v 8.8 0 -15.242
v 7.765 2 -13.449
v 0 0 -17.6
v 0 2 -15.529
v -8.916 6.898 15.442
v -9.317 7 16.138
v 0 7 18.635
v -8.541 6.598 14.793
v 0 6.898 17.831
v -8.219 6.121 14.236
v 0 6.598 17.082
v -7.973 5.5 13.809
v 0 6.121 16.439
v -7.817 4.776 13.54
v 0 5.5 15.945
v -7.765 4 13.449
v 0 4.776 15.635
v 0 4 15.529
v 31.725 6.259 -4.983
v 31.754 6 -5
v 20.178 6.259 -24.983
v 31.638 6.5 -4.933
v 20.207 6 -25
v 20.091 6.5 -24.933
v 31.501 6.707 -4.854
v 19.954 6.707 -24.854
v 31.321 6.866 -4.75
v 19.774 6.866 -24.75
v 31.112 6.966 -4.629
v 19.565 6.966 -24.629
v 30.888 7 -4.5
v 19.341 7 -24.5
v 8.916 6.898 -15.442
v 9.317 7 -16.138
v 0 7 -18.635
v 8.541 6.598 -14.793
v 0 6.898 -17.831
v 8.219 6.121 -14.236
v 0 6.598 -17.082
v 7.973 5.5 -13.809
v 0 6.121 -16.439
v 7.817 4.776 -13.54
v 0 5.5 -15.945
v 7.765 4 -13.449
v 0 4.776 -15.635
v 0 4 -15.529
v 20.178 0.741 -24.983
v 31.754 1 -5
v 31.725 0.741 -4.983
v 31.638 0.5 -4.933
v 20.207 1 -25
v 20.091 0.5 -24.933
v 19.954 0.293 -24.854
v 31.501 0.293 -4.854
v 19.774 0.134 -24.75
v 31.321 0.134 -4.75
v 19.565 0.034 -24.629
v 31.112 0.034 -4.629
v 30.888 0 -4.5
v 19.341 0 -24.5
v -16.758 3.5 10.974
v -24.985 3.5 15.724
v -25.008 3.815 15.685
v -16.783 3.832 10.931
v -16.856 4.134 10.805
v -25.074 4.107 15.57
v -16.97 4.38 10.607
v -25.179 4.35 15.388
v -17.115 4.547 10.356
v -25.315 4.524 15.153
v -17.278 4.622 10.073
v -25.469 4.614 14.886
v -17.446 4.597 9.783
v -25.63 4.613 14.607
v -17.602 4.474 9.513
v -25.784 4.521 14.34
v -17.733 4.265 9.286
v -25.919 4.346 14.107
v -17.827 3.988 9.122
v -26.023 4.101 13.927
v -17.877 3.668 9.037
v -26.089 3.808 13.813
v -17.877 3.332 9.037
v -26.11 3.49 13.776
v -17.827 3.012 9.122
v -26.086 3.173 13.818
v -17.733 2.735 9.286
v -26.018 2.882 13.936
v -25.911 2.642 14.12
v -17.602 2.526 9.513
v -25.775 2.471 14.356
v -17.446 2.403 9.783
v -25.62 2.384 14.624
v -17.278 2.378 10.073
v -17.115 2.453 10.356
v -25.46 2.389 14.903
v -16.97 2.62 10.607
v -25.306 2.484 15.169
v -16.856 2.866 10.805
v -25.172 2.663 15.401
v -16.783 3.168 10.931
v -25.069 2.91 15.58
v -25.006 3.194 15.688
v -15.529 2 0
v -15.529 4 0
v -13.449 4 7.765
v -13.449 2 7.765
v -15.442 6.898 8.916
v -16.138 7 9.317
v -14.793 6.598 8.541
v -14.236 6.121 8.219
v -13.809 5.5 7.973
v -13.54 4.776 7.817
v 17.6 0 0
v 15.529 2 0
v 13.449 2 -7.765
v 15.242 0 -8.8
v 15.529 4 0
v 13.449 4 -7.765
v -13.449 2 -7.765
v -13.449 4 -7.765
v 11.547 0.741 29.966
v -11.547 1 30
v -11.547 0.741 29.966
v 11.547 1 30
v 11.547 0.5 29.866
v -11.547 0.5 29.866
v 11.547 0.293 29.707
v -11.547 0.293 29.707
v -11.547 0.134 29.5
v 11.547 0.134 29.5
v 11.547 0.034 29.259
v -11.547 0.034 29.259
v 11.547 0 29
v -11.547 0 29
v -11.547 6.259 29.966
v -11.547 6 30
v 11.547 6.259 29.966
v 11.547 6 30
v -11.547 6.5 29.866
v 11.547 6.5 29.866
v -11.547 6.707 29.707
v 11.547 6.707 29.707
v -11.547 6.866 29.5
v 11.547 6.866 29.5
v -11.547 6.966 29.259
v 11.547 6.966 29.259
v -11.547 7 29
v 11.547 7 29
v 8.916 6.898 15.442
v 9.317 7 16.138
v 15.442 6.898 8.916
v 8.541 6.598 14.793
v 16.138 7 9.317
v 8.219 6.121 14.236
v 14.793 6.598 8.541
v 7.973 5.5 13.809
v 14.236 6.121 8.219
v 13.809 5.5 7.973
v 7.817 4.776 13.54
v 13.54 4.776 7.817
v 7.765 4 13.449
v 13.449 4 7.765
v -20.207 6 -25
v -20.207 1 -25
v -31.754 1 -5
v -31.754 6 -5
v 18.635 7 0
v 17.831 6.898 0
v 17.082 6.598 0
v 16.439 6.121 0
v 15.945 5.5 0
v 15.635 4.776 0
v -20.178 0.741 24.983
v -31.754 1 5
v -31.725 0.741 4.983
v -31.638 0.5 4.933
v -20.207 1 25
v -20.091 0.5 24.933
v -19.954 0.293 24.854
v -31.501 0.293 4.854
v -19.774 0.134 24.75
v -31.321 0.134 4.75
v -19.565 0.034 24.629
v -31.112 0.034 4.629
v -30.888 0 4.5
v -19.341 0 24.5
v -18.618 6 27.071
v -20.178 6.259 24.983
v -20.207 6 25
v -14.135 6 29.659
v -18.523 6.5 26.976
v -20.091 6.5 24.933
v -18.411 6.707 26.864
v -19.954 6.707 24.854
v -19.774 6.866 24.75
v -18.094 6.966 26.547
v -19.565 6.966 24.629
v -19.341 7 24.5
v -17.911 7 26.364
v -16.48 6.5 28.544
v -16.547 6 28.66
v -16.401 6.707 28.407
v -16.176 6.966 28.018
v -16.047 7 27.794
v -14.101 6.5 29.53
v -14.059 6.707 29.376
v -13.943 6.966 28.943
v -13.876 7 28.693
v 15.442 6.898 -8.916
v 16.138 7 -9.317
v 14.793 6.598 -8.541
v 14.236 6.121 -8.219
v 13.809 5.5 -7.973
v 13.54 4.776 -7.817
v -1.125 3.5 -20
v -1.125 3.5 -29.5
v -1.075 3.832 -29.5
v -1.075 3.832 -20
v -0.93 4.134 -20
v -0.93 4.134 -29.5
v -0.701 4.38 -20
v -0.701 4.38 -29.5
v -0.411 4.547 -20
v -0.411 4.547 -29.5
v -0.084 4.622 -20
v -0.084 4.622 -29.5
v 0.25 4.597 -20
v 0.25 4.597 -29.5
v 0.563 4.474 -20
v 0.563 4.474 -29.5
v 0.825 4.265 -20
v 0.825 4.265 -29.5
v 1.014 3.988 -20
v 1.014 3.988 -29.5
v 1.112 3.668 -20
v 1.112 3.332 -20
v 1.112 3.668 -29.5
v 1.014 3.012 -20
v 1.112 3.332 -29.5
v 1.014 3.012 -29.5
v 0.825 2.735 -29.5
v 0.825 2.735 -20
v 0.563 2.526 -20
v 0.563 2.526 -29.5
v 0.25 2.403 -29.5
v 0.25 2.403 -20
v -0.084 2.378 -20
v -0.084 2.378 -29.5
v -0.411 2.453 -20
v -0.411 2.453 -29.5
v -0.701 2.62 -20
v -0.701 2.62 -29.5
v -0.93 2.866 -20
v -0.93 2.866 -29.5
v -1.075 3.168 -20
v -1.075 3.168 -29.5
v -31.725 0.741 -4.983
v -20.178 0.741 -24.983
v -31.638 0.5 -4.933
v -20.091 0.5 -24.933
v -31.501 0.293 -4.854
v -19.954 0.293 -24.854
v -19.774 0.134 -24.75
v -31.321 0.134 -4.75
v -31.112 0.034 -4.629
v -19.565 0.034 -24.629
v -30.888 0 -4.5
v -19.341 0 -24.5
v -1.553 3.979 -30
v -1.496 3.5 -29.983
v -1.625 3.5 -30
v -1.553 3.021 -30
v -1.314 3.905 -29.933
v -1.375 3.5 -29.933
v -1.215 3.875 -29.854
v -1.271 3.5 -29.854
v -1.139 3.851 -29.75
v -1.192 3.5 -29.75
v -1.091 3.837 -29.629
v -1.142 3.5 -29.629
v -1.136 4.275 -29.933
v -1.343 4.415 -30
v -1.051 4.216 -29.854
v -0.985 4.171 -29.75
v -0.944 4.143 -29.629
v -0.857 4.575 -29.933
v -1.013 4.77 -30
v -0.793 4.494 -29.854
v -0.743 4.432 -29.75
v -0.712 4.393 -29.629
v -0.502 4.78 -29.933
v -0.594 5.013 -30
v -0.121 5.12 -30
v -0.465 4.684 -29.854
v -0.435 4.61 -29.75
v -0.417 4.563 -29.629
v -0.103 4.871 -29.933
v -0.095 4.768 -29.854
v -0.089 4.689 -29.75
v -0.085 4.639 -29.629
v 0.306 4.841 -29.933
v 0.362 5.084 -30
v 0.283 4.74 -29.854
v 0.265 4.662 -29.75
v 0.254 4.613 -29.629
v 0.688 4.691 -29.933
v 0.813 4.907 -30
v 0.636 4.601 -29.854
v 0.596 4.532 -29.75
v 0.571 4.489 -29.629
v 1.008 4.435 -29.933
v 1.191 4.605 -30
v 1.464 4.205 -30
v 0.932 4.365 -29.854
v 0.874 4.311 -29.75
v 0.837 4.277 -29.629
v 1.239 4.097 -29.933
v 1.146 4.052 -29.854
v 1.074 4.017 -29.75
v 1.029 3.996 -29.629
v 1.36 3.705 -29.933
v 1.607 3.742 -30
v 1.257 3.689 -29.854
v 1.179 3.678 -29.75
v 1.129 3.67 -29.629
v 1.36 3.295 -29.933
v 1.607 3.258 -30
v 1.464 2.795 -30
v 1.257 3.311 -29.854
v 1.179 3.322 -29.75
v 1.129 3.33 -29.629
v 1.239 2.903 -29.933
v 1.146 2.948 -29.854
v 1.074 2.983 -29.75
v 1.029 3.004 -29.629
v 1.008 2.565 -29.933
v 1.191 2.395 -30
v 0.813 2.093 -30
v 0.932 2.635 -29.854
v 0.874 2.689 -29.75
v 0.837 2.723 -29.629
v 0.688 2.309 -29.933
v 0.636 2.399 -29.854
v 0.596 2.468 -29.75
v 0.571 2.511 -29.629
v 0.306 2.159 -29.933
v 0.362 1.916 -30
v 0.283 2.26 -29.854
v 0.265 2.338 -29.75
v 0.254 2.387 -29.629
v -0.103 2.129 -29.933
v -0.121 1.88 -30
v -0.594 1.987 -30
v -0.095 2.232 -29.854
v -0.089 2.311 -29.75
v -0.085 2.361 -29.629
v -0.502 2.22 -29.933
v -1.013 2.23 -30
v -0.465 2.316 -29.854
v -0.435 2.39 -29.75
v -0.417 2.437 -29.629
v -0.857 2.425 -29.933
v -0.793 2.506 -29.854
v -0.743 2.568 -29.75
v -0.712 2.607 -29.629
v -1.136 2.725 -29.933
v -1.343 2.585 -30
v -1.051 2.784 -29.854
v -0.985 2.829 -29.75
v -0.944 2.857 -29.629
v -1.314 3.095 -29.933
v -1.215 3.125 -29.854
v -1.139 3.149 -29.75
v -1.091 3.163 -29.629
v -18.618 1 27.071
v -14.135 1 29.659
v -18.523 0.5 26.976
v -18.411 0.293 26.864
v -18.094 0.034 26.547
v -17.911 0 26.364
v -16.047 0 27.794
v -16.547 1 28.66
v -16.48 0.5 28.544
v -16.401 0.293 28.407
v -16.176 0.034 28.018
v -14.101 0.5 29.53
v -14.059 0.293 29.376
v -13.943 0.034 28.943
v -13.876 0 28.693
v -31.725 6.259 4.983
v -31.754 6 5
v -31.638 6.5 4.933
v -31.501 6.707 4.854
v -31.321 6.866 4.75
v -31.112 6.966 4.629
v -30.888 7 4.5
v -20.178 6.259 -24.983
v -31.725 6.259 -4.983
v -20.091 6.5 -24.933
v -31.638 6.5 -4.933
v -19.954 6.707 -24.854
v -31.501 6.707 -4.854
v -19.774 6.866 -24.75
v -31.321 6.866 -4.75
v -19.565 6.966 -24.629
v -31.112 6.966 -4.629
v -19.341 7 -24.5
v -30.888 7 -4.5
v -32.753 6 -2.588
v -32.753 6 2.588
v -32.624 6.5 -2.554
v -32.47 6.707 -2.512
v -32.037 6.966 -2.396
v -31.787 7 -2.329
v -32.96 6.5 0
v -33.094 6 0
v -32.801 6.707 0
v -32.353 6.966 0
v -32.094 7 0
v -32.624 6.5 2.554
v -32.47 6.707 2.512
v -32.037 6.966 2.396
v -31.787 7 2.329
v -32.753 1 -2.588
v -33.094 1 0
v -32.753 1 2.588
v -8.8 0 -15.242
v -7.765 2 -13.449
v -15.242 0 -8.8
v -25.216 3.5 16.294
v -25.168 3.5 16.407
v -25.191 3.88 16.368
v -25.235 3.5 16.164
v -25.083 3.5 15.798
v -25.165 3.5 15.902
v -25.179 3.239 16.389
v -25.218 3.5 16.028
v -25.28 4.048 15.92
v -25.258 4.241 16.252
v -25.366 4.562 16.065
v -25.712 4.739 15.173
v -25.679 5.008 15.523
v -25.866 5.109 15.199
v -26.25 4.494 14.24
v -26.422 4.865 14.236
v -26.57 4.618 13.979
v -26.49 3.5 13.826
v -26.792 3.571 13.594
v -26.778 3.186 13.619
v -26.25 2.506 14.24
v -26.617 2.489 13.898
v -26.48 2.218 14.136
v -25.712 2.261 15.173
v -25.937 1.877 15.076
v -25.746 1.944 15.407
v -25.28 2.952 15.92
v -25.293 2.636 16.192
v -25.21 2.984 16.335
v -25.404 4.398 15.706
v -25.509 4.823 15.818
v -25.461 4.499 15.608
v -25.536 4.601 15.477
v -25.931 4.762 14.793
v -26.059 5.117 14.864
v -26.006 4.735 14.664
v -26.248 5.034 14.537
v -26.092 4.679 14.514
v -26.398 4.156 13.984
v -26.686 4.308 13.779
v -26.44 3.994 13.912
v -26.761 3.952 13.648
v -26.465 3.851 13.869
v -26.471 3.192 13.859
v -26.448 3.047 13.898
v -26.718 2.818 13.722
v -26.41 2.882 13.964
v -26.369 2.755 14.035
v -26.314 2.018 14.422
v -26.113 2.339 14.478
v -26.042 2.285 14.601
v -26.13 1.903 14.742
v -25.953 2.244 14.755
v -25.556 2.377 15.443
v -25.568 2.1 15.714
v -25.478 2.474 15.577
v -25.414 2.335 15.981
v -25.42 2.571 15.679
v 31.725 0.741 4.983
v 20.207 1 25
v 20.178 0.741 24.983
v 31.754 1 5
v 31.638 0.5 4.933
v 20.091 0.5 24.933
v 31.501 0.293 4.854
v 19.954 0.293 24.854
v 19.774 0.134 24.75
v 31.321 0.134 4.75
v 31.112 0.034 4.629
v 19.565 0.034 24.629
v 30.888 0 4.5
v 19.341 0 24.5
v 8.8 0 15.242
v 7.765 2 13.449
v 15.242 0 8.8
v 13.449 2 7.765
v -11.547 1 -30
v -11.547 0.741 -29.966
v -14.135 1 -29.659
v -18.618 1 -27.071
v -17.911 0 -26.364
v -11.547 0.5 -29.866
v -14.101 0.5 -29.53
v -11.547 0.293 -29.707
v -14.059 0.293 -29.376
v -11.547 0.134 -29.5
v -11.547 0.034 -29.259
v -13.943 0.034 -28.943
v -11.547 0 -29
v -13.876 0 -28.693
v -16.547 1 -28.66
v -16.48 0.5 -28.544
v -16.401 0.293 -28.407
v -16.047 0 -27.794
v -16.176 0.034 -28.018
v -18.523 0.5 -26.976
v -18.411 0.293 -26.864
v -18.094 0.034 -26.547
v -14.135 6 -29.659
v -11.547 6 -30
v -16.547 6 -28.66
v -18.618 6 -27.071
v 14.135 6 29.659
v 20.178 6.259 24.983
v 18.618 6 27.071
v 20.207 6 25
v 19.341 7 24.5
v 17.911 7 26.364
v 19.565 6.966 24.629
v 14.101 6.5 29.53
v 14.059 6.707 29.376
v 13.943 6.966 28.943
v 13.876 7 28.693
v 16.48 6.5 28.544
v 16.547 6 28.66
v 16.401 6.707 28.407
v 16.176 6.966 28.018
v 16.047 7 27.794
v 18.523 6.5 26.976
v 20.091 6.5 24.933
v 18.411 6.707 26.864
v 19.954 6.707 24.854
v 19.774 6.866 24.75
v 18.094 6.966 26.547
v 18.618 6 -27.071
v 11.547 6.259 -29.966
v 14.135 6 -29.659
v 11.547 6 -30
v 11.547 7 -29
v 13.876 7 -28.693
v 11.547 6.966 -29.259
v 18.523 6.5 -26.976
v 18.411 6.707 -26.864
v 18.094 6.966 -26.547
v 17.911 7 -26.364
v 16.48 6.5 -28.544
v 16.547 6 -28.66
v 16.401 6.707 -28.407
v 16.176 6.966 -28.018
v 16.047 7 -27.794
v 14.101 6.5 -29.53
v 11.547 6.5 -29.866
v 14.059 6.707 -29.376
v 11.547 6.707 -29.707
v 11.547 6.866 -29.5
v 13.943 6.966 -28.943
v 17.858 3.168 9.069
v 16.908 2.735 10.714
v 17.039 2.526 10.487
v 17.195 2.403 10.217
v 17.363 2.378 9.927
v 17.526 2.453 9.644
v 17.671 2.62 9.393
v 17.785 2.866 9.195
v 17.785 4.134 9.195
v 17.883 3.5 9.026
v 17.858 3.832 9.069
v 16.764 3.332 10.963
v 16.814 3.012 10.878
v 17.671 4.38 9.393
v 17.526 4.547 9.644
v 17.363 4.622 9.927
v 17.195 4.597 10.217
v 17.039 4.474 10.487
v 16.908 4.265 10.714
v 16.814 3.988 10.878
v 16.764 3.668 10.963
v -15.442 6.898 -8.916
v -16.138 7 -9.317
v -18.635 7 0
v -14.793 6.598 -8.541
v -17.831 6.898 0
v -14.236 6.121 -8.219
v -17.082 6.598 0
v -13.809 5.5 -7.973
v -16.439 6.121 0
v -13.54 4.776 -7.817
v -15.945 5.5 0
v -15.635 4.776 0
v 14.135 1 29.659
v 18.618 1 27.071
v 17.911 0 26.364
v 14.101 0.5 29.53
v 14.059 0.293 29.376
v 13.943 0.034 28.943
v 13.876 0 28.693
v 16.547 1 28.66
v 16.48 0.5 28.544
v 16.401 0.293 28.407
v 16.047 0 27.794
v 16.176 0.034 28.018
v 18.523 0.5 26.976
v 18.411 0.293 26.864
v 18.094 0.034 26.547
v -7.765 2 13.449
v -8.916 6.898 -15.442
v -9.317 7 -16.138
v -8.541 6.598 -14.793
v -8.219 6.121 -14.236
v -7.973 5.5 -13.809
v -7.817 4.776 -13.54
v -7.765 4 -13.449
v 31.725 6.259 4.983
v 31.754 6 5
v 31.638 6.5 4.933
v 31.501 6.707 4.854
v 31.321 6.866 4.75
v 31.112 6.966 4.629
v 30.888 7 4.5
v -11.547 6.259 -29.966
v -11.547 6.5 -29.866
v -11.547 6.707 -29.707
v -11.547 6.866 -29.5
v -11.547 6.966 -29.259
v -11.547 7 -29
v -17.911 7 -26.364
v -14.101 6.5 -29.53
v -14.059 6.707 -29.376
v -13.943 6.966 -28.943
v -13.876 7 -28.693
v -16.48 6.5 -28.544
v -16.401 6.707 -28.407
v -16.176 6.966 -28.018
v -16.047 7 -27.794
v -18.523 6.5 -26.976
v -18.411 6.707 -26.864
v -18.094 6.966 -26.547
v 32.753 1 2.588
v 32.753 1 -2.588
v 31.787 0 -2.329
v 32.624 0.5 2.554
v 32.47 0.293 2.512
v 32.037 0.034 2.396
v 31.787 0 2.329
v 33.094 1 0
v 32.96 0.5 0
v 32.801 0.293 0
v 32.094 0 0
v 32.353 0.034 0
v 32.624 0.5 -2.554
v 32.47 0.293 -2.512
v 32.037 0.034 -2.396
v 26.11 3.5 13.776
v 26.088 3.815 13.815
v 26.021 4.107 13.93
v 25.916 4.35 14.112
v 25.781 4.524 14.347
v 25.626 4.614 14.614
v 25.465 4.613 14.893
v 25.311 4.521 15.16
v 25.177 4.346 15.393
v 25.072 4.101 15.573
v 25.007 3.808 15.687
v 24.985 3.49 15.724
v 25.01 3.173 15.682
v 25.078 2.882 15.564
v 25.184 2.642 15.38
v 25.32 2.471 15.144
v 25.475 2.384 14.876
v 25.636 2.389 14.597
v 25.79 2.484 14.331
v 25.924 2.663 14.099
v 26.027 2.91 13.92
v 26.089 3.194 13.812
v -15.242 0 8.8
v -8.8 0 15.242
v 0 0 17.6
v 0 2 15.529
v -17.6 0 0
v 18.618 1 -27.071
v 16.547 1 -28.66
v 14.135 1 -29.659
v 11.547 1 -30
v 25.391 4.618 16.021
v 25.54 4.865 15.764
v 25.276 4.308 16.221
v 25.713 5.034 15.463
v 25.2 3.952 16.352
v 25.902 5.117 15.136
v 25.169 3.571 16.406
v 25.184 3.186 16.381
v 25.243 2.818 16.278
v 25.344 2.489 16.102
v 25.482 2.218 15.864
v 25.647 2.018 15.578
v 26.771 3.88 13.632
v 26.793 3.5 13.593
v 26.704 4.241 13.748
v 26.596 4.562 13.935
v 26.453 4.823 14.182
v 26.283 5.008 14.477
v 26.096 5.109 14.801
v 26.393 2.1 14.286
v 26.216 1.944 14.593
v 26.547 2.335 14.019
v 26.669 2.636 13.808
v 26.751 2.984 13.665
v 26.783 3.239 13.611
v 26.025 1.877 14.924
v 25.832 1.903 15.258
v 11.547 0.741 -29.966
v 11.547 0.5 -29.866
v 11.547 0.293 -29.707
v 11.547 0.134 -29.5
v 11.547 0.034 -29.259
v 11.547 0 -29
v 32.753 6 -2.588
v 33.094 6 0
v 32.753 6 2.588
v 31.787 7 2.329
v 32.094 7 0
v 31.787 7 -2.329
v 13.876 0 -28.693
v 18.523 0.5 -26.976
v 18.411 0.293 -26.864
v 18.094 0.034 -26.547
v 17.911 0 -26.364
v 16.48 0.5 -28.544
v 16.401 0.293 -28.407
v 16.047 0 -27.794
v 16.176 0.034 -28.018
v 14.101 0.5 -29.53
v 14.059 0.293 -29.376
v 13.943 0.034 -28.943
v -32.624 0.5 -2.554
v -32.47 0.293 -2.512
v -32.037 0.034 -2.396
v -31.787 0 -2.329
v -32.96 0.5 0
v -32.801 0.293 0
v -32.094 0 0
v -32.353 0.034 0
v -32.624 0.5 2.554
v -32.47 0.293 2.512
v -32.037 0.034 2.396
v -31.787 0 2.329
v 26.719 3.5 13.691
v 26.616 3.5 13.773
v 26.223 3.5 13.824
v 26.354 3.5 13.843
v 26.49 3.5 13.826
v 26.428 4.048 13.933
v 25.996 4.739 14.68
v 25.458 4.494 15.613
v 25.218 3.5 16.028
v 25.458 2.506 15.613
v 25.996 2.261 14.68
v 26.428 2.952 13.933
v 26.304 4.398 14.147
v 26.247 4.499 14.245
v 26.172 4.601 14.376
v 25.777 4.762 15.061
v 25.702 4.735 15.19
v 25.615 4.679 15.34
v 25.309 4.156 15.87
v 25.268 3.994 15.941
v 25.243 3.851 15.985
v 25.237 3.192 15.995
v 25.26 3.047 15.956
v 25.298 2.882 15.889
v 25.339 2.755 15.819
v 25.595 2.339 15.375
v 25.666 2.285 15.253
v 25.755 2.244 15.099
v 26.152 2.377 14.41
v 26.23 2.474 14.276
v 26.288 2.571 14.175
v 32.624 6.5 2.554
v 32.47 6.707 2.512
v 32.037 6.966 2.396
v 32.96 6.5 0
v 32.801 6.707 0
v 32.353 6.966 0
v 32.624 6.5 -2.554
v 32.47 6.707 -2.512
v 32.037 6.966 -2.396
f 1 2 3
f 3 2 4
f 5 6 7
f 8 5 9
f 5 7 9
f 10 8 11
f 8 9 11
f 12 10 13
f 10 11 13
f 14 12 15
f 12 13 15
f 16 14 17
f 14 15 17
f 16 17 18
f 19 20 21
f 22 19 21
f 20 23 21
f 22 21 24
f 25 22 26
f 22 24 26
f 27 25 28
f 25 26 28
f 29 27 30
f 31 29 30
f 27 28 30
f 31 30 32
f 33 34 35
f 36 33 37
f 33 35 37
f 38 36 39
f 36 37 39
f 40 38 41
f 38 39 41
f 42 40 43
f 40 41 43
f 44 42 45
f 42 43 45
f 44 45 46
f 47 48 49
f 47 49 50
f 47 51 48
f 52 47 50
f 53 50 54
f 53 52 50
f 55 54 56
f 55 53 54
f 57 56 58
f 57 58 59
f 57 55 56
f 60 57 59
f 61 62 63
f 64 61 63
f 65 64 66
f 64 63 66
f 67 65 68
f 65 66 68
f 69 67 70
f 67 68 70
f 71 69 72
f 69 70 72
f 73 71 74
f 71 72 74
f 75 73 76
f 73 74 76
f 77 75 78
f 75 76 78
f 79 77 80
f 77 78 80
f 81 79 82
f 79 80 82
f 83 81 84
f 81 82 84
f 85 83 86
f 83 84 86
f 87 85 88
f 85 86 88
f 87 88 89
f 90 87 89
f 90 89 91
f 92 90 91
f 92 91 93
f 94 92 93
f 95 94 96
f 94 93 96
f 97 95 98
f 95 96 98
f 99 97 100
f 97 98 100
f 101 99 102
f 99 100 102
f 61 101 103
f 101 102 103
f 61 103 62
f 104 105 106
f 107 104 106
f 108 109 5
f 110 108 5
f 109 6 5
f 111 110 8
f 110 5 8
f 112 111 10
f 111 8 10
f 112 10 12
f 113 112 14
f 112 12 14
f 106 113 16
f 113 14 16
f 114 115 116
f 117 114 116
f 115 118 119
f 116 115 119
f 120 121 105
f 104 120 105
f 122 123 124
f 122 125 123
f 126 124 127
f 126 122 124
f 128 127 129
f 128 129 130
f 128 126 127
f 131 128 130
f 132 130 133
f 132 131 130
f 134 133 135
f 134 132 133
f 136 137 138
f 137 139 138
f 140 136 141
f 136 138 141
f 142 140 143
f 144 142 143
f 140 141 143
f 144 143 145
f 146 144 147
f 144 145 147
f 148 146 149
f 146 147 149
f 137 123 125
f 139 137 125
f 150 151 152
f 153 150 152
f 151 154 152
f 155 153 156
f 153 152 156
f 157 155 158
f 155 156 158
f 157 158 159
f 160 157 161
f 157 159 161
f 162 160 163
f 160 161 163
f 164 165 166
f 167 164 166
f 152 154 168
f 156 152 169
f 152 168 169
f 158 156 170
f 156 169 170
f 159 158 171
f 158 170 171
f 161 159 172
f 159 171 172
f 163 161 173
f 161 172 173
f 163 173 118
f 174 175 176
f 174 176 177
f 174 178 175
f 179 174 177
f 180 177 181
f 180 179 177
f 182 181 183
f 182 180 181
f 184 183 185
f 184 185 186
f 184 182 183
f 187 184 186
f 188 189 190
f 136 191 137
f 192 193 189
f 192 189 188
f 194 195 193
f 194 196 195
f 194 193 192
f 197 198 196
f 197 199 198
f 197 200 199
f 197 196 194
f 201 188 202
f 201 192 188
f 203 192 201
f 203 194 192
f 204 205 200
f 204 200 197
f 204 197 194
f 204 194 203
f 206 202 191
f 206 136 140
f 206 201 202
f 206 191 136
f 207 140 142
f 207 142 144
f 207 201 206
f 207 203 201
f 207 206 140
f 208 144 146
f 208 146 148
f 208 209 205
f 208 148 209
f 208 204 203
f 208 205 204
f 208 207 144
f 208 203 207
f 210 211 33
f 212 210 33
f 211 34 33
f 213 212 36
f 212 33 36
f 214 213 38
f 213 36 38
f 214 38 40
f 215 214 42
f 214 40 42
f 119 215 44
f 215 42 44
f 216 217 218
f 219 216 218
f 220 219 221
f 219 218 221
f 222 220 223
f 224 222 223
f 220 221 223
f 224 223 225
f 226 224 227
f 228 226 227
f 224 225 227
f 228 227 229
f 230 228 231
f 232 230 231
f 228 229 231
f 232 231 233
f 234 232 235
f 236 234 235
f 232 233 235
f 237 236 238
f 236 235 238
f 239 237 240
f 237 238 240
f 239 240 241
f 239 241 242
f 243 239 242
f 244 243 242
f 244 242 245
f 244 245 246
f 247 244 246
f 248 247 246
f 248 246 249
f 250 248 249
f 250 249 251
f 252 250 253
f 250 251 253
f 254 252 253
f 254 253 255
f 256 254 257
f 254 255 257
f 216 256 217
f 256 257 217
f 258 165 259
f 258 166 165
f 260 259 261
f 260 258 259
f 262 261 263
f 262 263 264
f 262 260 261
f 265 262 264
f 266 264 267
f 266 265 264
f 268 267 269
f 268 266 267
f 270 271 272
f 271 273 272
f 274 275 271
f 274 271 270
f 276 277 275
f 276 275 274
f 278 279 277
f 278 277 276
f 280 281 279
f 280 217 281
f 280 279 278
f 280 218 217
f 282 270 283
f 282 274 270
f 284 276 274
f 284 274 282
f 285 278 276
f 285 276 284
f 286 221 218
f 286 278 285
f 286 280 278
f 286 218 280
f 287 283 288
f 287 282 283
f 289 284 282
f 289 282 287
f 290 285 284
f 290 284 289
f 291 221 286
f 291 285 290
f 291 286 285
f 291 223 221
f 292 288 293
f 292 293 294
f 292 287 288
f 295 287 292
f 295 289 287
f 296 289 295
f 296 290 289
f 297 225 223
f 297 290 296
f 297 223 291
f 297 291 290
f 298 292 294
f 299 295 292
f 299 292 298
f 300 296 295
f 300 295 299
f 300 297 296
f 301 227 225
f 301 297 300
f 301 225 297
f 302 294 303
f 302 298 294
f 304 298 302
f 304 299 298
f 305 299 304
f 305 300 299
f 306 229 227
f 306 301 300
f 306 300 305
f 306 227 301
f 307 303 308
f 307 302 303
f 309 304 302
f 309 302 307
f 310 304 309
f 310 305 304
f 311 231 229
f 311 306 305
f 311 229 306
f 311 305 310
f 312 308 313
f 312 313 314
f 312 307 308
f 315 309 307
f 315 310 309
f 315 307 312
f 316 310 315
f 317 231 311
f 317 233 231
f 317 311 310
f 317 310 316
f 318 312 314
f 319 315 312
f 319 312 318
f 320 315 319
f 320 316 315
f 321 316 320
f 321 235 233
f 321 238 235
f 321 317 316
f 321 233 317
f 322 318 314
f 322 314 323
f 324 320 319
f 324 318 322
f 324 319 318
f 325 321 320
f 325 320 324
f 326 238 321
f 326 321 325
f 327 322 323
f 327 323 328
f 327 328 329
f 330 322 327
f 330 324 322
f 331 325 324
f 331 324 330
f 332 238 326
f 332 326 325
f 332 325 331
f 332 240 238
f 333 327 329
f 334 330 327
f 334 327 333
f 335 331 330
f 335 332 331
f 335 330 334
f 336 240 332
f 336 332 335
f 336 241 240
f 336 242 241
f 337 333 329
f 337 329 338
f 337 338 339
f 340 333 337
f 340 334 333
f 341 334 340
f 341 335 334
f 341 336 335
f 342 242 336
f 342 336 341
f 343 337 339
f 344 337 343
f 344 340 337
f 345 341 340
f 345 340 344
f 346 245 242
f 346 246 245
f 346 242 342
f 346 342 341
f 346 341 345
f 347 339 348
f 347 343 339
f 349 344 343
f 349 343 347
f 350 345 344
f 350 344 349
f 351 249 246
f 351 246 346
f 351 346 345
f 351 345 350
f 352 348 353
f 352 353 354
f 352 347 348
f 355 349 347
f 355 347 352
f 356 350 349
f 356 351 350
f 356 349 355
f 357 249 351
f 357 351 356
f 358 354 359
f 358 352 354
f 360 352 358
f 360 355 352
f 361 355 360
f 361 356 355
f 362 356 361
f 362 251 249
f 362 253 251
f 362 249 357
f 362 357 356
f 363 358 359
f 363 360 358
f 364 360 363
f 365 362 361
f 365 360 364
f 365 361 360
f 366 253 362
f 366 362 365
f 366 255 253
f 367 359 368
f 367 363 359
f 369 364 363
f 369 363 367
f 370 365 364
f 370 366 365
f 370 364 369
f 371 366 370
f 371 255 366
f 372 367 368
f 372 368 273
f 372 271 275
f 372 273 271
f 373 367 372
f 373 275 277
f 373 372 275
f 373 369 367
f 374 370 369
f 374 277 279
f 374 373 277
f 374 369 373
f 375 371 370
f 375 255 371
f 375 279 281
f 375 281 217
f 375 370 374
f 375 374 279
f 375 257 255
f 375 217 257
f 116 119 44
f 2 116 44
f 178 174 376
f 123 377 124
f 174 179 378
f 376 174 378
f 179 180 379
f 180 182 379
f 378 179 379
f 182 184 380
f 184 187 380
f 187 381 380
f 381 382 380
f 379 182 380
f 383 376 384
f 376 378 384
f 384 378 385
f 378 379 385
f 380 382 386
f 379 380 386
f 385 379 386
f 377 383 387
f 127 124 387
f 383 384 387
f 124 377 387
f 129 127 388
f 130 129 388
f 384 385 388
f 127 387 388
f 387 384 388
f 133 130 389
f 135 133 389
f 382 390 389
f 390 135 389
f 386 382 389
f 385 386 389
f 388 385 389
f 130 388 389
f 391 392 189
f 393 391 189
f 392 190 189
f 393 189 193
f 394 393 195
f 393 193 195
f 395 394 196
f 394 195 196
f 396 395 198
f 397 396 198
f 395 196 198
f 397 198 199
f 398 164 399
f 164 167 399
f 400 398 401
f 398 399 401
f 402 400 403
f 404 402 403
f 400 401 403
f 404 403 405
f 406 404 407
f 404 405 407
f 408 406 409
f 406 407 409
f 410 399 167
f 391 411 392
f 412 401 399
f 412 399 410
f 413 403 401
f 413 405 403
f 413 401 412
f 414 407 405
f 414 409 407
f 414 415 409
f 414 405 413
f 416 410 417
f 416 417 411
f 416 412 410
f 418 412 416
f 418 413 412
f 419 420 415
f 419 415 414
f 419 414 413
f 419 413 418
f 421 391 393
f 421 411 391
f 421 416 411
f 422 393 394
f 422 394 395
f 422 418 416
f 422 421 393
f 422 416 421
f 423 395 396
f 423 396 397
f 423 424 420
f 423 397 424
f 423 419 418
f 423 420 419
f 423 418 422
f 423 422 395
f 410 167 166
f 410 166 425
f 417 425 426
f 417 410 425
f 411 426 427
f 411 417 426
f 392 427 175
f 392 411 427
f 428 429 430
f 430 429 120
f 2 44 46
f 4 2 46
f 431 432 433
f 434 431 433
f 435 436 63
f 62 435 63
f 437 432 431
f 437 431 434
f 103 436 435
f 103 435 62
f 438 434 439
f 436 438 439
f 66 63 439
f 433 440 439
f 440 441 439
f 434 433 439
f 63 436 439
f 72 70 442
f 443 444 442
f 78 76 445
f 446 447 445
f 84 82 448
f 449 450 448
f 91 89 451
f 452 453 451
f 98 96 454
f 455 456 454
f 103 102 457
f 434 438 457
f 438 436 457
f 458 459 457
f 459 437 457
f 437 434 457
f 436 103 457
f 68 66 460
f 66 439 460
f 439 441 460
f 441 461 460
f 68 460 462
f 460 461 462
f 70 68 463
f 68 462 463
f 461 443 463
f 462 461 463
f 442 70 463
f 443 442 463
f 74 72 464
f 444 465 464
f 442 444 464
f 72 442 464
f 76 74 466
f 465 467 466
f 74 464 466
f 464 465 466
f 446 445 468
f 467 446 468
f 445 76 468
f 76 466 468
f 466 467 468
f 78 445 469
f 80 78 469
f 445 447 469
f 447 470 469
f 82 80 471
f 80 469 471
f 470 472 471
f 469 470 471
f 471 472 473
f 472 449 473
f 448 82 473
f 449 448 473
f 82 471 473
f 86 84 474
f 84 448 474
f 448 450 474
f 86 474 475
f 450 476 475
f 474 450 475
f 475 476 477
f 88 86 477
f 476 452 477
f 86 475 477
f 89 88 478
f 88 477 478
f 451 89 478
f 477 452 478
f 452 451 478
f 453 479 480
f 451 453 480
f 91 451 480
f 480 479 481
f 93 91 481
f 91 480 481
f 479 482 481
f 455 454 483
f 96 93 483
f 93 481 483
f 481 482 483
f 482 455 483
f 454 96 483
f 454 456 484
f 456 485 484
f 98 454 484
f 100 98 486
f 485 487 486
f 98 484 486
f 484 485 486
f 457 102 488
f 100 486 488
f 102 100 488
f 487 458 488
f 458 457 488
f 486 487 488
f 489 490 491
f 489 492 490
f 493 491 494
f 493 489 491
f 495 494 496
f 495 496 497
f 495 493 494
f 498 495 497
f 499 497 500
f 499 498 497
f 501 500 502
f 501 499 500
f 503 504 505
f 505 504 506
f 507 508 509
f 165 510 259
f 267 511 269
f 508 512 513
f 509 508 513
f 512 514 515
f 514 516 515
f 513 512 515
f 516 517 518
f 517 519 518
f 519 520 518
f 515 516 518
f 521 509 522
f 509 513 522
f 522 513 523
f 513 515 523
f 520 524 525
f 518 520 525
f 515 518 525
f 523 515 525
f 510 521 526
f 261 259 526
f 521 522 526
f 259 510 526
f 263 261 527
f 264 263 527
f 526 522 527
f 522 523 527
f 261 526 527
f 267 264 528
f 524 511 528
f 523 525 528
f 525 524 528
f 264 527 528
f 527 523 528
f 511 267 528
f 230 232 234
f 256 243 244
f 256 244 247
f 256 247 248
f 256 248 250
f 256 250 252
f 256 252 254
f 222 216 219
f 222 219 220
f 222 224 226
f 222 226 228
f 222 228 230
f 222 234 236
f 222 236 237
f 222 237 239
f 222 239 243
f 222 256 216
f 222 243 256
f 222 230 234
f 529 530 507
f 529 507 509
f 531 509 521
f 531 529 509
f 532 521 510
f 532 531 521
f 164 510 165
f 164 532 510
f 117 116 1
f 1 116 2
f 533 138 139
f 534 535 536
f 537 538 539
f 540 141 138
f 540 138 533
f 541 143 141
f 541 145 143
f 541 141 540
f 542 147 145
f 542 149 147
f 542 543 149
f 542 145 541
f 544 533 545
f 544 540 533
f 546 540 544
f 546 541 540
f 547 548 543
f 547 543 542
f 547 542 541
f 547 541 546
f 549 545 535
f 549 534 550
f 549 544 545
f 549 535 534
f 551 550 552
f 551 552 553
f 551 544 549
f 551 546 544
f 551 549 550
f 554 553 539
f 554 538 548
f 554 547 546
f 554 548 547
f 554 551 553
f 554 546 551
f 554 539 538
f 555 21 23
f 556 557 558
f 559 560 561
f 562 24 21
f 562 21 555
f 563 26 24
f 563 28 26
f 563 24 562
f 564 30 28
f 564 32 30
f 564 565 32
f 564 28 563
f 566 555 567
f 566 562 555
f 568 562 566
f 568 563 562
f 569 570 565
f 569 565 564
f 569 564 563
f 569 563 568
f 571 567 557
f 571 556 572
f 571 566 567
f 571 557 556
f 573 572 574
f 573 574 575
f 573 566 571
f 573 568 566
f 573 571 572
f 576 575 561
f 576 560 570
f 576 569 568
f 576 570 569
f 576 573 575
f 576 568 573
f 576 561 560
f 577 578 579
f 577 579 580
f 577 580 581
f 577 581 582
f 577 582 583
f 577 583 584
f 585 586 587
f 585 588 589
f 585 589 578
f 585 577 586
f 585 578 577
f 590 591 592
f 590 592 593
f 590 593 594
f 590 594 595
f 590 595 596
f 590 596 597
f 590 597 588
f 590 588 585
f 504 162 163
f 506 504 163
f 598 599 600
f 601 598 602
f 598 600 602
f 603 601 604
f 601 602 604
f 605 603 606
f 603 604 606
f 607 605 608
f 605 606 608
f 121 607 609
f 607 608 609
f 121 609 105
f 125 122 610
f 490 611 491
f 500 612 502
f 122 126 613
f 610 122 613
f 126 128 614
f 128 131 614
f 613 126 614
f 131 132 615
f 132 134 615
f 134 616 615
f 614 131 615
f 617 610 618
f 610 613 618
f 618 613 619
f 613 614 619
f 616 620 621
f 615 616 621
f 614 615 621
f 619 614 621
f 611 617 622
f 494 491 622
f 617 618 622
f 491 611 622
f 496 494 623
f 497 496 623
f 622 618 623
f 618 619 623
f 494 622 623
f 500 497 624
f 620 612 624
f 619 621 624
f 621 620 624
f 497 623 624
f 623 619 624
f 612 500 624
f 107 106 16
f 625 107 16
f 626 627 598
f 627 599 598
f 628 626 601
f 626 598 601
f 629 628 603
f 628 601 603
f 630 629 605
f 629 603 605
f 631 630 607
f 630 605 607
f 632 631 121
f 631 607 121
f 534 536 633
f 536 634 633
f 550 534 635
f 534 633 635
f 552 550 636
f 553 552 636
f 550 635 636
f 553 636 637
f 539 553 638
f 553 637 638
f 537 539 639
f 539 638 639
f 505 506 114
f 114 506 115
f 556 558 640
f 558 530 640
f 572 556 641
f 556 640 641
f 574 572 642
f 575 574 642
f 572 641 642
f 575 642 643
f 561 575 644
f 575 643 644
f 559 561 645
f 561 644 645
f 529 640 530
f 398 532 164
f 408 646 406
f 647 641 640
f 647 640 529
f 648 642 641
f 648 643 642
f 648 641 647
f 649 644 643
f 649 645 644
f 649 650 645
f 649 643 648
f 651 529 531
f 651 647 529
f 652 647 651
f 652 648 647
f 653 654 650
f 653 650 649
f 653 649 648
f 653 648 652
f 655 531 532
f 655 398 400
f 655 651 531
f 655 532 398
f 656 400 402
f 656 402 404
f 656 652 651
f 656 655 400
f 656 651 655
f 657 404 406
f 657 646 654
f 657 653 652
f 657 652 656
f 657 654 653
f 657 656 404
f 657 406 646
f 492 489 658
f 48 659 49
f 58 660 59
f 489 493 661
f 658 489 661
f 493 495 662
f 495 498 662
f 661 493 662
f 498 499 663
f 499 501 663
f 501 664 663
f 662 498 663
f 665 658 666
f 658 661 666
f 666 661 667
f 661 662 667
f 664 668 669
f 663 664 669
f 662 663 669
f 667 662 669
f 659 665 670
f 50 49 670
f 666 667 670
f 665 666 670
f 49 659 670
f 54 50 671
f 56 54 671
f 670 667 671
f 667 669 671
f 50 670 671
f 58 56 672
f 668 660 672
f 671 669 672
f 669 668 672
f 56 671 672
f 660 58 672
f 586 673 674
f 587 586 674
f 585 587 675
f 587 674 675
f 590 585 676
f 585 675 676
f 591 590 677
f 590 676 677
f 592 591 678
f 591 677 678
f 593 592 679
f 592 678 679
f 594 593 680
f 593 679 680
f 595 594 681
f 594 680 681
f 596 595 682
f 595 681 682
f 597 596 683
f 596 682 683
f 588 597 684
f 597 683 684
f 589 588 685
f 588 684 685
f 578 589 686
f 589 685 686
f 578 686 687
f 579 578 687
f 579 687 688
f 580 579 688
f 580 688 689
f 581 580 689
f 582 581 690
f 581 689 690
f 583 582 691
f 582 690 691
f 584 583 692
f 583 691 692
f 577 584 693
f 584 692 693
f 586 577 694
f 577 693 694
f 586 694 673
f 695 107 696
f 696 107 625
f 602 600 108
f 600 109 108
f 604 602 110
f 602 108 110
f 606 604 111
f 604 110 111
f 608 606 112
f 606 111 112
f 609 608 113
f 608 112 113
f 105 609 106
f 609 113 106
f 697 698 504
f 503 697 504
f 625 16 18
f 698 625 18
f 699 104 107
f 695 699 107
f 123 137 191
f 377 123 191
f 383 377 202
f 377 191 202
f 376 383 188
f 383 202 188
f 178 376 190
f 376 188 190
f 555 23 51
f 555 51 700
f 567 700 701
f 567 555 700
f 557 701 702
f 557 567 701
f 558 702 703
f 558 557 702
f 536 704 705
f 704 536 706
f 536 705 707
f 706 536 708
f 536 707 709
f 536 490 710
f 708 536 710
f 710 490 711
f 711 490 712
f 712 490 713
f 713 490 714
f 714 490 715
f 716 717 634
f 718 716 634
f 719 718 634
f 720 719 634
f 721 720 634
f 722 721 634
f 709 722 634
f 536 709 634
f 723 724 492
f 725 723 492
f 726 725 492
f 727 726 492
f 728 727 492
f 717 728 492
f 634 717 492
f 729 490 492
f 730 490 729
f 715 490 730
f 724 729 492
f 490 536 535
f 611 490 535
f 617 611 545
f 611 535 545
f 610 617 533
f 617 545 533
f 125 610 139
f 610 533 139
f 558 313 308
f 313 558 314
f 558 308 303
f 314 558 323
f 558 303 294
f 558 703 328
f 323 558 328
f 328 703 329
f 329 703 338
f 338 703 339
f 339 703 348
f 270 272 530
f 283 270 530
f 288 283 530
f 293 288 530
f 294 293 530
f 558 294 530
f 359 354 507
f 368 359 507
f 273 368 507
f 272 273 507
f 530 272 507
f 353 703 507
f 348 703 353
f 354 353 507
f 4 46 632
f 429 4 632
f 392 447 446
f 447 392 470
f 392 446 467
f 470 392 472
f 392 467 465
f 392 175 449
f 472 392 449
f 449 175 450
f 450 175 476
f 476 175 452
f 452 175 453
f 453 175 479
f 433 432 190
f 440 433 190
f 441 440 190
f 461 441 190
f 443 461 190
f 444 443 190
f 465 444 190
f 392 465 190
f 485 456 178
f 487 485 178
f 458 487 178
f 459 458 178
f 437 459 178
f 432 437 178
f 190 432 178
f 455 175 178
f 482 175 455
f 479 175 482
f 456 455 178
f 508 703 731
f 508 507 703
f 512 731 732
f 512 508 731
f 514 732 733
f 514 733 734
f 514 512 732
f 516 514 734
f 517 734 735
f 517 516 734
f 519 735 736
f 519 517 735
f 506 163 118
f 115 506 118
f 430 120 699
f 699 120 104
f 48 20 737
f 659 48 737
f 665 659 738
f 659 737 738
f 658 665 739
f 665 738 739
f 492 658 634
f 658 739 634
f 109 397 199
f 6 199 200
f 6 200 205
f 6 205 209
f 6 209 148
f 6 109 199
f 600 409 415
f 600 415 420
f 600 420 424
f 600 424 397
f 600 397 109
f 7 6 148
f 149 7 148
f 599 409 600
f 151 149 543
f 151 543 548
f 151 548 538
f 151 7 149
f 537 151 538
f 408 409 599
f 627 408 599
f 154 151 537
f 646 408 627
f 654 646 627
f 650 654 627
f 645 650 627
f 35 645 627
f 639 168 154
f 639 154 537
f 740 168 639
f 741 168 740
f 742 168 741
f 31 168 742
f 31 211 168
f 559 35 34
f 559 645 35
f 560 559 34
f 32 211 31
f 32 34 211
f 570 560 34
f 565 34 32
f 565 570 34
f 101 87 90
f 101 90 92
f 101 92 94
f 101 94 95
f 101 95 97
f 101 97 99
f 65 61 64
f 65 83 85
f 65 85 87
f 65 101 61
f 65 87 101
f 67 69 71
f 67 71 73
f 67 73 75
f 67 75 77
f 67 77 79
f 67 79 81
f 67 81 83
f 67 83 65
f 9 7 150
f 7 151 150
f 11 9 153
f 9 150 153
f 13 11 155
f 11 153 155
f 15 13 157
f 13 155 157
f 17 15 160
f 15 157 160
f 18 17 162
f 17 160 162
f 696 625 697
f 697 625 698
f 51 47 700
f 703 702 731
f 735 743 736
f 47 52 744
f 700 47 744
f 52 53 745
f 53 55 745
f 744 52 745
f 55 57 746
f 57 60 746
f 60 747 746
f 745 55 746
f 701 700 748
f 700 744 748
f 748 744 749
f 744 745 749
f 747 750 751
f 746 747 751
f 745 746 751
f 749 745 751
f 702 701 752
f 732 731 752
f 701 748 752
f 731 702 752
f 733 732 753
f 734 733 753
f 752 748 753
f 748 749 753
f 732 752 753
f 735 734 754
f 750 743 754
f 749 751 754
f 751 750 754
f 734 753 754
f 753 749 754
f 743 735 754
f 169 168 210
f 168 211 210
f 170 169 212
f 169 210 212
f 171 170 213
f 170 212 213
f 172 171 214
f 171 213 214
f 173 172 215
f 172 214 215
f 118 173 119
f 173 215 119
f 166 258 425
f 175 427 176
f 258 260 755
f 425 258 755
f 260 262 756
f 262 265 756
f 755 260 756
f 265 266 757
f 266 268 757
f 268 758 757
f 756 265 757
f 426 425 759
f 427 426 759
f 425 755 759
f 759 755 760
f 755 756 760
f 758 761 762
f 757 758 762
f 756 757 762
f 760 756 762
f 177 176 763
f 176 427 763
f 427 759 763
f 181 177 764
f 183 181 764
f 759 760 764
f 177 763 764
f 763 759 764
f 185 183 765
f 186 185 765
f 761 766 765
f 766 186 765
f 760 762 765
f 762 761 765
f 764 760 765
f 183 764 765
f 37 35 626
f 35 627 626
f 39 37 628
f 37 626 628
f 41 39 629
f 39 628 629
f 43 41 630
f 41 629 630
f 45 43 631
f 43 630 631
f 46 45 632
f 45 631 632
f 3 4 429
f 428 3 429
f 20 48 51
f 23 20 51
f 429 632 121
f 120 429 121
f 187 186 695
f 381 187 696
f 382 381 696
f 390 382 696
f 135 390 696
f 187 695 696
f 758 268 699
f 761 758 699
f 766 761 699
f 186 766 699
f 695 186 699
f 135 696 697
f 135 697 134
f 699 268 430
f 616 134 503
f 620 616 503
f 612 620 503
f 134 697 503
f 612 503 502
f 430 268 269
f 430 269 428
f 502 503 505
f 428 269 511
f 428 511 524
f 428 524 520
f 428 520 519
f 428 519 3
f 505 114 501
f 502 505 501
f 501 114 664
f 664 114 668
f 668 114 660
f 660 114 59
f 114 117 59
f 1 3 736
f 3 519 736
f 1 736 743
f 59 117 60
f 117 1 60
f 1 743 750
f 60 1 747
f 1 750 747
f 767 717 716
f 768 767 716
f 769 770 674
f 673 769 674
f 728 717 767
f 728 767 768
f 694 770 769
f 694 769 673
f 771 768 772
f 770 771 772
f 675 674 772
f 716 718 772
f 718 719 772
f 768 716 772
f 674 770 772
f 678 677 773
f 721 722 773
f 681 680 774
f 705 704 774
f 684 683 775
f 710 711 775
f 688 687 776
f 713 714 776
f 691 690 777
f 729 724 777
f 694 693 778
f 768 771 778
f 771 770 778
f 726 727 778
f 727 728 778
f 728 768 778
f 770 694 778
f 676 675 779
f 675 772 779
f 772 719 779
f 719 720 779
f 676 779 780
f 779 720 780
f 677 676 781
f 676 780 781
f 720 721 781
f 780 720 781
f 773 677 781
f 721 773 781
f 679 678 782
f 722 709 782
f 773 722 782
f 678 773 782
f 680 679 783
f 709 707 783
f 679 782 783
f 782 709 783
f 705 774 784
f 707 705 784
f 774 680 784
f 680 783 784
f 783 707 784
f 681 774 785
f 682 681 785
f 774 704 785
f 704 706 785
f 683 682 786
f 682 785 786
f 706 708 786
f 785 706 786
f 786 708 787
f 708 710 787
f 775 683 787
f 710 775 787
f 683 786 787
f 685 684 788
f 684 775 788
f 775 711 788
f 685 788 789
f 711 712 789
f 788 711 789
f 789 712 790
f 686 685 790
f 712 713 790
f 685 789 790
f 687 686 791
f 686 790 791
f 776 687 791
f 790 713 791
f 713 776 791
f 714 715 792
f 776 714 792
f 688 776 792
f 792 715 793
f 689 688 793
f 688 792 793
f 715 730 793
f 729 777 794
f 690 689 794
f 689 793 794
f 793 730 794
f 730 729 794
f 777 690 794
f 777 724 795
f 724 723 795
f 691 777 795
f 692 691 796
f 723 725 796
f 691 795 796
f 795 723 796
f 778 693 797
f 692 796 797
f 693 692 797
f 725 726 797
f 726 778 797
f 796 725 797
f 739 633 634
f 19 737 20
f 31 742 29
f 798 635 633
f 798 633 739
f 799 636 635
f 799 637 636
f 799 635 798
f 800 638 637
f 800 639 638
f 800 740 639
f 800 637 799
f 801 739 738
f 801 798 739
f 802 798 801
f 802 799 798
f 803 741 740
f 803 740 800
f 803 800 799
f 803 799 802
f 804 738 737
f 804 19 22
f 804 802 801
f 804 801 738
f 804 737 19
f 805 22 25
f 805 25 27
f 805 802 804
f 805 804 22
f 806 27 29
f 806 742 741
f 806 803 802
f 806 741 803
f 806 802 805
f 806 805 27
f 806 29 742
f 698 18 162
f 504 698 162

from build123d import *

# Parameters (mm, degrees)
SALIENTE_EXTRUIR1_DEPTH = 7
CROQUIS2_R              = 1.125
CORTAR_EXTRUIR1_DEPTH   = 10
CROQUIS4_R              = 1.125
CORTAR_EXTRUIR2_DEPTH   = 10
CROQUIS5_R              = 1.125
CORTAR_EXTRUIR3_DEPTH   = 10
REDONDEO1_R             = 10
REDONDEO2_R             = 0.5
REDONDEO3_R             = 1
CORTAR_EXTRUIR4_DEPTH   = 10
REDONDEO4_R             = 3
REDONDEO5_R             = 1
CHAFL_N1_SIZE           = 2


with BuildPart() as part:
    # Croquis1 → Saliente-Extruir1 (new body)
    with BuildSketch(Plane(origin=(0, 0, 0), x_dir=(1, 0, 0), z_dir=(0, 1, 0))):
        Polygon((34.641016151, 0), (17.320508076, 30), (-17.320508076, 30), (-34.641016151, 0), (-17.320508076, -30), (17.320508076, -30), align=None)
    extrude(amount=SALIENTE_EXTRUIR1_DEPTH)

    # Croquis2 → Cortar-Extruir1 (cut)
    with BuildSketch(Plane(origin=(25.980762114, 0, 15), x_dir=(0.5, 0, -0.866025404), z_dir=(0.866025404, 0, 0.5))):
        with Locations((0, 3.5)):
            Circle(CROQUIS2_R)
    extrude(amount=-CORTAR_EXTRUIR1_DEPTH, mode=Mode.SUBTRACT)

    # Croquis4 → Cortar-Extruir2 (cut)
    with BuildSketch(Plane(origin=(-25.980762114, 0, 15), x_dir=(0.5, 0, 0.866025404), z_dir=(-0.866025404, 0, 0.5))):
        with Locations((0, 3.5)):
            Circle(CROQUIS4_R)
    extrude(amount=-CORTAR_EXTRUIR2_DEPTH, mode=Mode.SUBTRACT)

    # Croquis5 → Cortar-Extruir3 (cut)
    with BuildSketch(Plane(origin=(0, 0, -30), x_dir=(-1, 0, 0), z_dir=(0, 0, -1))):
        with Locations((0, 3.5)):
            Circle(CROQUIS5_R)
    extrude(amount=-CORTAR_EXTRUIR3_DEPTH, mode=Mode.SUBTRACT)

    # Redondeo1
    redondeo1_edges = [part.edges().sort_by_distance(p)[0] for p in [
        (17.320508076, 3.5, 30),
        (-17.320508076, 3.5, 30),
        (-34.641016151, 3.5, 0),
        (-17.320508076, 3.5, -30),
        (17.320508076, 3.5, -30),
        (34.641016151, 3.5, 0),
    ]]
    fillet(redondeo1_edges, radius=REDONDEO1_R)

    # Redondeo2
    redondeo2_edges = [part.edges().sort_by_distance(p)[0] for p in [
        (25.418262114, 3.5, 15.974278579),
        (-26.543262114, 3.5, 14.025721421),
        (1.125, 3.5, -30),
    ]]
    fillet(redondeo2_edges, radius=REDONDEO2_R)

    # Redondeo3
    redondeo3_edges = [part.edges().sort_by_distance(p)[0] for p in [
        (25.980762114, 7, 15),
        (0, 7, 30),
        (25.980762114, 7, -15),
        (0, 7, -30),
        (-25.980762114, 7, -15),
        (-25.980762114, 7, 15),
        (-16.547005384, 7, -28.660254038),
        (-33.094010768, 7, 0),
        (-16.547005384, 7, 28.660254038),
        (16.547005384, 7, -28.660254038),
        (33.094010768, 7, 0),
        (16.547005384, 7, 28.660254038),
    ]]
    fillet(redondeo3_edges, radius=REDONDEO3_R)

    # Croquis6 → Cortar-Extruir4 (cut)
    with BuildSketch(Plane(origin=(0, 7, 0), x_dir=(1, 0, 0), z_dir=(0, 1, 0))):
        Polygon((-15.529142706, 0), (-13.448632083, -7.764571353), (-7.764571353, -13.448632083), (0, -15.529142706), (7.764571353, -13.448632083), (13.448632083, -7.764571353), (15.529142706, 0), (13.448632083, 7.764571353), (7.764571353, 13.448632083), (0, 15.529142706), (-7.764571353, 13.448632083), (-13.448632083, 7.764571353), align=None)
    extrude(amount=-CORTAR_EXTRUIR4_DEPTH, mode=Mode.SUBTRACT)

    # Redondeo4
    redondeo4_edges = [part.edges().sort_by_distance(p)[0] for p in [
        (-14.488887394, 7, -3.882285677),
        (-14.488887394, 7, 3.882285677),
        (-10.606601718, 7, 10.606601718),
        (-3.882285677, 7, 14.488887394),
        (3.882285677, 7, 14.488887394),
        (10.606601718, 7, 10.606601718),
        (14.488887394, 7, 3.882285677),
        (14.488887394, 7, -3.882285677),
        (10.606601718, 7, -10.606601718),
        (3.882285677, 7, -14.488887394),
        (-3.882285677, 7, -14.488887394),
        (-10.606601718, 7, -10.606601718),
    ]]
    fillet(redondeo4_edges, radius=REDONDEO4_R)

    # Redondeo5
    redondeo5_edges = [part.edges().sort_by_distance(p)[0] for p in [
        (25.980762114, 0, 15),
        (0, 0, 30),
        (-25.980762114, 0, 15),
        (-25.980762114, 0, -15),
        (0, 0, -30),
        (25.980762114, 0, -15),
        (-16.547005384, 0, -28.660254038),
        (-33.094010768, 0, 0),
        (-16.547005384, 0, 28.660254038),
        (16.547005384, 0, -28.660254038),
        (33.094010768, 0, 0),
        (16.547005384, 0, 28.660254038),
    ]]
    fillet(redondeo5_edges, radius=REDONDEO5_R)

    # Chaflán1
    chafl_n1_edges = [part.edges().sort_by_distance(p)[0] for p in [
        (-14.488887394, 0, 3.882285677),
        (-10.606601718, 0, 10.606601718),
        (-3.882285677, 0, 14.488887394),
        (3.882285677, 0, 14.488887394),
        (10.606601718, 0, 10.606601718),
        (14.488887394, 0, 3.882285677),
        (14.488887394, 0, -3.882285677),
        (10.606601718, 0, -10.606601718),
        (3.882285677, 0, -14.488887394),
        (-3.882285677, 0, -14.488887394),
        (-10.606601718, 0, -10.606601718),
        (-14.488887394, 0, -3.882285677),
    ]]
    chamfer(chafl_n1_edges, length=CHAFL_N1_SIZE)


solid = part.part
